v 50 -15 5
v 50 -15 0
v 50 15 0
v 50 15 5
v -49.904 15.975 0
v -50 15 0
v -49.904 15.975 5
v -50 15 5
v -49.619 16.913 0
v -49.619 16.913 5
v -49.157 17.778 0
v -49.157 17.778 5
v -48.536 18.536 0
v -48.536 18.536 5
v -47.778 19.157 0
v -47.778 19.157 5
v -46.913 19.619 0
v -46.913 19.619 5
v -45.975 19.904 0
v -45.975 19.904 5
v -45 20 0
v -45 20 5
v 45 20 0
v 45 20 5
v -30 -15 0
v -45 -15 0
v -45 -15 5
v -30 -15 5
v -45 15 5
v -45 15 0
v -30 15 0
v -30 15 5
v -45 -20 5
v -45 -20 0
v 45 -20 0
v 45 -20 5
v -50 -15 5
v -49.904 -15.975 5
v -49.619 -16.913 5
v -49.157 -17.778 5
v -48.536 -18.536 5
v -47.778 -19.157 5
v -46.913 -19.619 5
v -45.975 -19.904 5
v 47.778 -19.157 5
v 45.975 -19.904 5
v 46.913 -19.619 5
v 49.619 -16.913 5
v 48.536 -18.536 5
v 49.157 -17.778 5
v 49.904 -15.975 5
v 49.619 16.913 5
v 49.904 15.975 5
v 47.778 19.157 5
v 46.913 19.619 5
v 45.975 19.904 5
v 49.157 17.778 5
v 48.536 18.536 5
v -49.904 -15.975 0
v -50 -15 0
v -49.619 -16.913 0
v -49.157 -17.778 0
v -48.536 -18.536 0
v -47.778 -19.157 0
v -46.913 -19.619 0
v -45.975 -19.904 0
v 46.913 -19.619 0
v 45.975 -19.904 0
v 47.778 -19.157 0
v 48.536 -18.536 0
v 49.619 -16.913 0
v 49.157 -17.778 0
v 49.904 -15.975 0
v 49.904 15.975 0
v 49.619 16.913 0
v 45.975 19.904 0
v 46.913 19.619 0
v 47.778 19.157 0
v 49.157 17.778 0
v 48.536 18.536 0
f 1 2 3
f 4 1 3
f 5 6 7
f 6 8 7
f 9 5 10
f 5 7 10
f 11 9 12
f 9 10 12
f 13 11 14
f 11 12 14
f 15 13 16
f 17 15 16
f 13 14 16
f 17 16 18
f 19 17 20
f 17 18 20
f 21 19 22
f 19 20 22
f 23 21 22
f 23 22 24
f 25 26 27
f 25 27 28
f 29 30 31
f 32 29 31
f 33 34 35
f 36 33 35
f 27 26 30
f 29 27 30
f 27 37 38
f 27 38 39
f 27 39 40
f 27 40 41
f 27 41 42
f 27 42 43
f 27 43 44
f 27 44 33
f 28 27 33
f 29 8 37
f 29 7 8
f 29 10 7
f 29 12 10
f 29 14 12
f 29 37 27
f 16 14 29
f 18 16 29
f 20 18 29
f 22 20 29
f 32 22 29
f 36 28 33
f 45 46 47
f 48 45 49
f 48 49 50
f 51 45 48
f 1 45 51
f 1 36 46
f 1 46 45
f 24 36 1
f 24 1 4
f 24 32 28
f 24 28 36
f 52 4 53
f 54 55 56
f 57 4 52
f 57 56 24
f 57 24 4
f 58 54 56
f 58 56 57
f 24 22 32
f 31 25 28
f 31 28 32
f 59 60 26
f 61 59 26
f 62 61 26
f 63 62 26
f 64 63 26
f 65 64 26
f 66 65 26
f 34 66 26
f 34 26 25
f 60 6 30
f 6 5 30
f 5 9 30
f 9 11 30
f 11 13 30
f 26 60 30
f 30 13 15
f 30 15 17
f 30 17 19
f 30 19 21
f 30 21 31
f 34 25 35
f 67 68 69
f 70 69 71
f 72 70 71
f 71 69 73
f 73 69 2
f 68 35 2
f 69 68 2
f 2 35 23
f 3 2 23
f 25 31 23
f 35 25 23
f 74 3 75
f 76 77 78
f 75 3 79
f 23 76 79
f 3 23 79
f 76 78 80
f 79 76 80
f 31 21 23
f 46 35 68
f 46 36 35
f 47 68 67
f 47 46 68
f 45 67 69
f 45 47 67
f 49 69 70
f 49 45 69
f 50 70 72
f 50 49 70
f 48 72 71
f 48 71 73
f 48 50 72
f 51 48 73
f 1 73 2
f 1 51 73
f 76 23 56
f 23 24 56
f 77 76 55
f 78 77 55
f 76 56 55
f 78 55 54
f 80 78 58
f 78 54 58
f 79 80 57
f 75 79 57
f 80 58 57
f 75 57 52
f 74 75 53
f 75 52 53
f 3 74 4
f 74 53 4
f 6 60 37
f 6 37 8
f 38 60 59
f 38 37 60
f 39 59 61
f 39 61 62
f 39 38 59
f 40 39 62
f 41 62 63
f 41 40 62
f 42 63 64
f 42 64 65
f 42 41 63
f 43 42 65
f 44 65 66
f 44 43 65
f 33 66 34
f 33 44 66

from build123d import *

# Parameters (mm, degrees)
F0_W     = 100
F0_H     = 40
F0_W_2   = 15
F0_H_2   = 30
F1_DEPTH = 5
F2_R     = 5


with BuildPart() as f1:
    # F0 (on Top) → F1 (new body)
    with BuildSketch(Plane.XY):
        Rectangle(F0_W, F0_H)
        with Locations((-37.5, 0)):
            Rectangle(F0_W_2, F0_H_2, mode=Mode.SUBTRACT)
    extrude(amount=F1_DEPTH)

    # F2
    f2_edges = [f1.edges().sort_by_distance(p)[0] for p in [
        (-50, -20, 2.5),
        (50, -20, 2.5),
        (50, 20, 2.5),
        (-50, 20, 2.5),
    ]]
    fillet(f2_edges, radius=F2_R)


solid = f1.part
